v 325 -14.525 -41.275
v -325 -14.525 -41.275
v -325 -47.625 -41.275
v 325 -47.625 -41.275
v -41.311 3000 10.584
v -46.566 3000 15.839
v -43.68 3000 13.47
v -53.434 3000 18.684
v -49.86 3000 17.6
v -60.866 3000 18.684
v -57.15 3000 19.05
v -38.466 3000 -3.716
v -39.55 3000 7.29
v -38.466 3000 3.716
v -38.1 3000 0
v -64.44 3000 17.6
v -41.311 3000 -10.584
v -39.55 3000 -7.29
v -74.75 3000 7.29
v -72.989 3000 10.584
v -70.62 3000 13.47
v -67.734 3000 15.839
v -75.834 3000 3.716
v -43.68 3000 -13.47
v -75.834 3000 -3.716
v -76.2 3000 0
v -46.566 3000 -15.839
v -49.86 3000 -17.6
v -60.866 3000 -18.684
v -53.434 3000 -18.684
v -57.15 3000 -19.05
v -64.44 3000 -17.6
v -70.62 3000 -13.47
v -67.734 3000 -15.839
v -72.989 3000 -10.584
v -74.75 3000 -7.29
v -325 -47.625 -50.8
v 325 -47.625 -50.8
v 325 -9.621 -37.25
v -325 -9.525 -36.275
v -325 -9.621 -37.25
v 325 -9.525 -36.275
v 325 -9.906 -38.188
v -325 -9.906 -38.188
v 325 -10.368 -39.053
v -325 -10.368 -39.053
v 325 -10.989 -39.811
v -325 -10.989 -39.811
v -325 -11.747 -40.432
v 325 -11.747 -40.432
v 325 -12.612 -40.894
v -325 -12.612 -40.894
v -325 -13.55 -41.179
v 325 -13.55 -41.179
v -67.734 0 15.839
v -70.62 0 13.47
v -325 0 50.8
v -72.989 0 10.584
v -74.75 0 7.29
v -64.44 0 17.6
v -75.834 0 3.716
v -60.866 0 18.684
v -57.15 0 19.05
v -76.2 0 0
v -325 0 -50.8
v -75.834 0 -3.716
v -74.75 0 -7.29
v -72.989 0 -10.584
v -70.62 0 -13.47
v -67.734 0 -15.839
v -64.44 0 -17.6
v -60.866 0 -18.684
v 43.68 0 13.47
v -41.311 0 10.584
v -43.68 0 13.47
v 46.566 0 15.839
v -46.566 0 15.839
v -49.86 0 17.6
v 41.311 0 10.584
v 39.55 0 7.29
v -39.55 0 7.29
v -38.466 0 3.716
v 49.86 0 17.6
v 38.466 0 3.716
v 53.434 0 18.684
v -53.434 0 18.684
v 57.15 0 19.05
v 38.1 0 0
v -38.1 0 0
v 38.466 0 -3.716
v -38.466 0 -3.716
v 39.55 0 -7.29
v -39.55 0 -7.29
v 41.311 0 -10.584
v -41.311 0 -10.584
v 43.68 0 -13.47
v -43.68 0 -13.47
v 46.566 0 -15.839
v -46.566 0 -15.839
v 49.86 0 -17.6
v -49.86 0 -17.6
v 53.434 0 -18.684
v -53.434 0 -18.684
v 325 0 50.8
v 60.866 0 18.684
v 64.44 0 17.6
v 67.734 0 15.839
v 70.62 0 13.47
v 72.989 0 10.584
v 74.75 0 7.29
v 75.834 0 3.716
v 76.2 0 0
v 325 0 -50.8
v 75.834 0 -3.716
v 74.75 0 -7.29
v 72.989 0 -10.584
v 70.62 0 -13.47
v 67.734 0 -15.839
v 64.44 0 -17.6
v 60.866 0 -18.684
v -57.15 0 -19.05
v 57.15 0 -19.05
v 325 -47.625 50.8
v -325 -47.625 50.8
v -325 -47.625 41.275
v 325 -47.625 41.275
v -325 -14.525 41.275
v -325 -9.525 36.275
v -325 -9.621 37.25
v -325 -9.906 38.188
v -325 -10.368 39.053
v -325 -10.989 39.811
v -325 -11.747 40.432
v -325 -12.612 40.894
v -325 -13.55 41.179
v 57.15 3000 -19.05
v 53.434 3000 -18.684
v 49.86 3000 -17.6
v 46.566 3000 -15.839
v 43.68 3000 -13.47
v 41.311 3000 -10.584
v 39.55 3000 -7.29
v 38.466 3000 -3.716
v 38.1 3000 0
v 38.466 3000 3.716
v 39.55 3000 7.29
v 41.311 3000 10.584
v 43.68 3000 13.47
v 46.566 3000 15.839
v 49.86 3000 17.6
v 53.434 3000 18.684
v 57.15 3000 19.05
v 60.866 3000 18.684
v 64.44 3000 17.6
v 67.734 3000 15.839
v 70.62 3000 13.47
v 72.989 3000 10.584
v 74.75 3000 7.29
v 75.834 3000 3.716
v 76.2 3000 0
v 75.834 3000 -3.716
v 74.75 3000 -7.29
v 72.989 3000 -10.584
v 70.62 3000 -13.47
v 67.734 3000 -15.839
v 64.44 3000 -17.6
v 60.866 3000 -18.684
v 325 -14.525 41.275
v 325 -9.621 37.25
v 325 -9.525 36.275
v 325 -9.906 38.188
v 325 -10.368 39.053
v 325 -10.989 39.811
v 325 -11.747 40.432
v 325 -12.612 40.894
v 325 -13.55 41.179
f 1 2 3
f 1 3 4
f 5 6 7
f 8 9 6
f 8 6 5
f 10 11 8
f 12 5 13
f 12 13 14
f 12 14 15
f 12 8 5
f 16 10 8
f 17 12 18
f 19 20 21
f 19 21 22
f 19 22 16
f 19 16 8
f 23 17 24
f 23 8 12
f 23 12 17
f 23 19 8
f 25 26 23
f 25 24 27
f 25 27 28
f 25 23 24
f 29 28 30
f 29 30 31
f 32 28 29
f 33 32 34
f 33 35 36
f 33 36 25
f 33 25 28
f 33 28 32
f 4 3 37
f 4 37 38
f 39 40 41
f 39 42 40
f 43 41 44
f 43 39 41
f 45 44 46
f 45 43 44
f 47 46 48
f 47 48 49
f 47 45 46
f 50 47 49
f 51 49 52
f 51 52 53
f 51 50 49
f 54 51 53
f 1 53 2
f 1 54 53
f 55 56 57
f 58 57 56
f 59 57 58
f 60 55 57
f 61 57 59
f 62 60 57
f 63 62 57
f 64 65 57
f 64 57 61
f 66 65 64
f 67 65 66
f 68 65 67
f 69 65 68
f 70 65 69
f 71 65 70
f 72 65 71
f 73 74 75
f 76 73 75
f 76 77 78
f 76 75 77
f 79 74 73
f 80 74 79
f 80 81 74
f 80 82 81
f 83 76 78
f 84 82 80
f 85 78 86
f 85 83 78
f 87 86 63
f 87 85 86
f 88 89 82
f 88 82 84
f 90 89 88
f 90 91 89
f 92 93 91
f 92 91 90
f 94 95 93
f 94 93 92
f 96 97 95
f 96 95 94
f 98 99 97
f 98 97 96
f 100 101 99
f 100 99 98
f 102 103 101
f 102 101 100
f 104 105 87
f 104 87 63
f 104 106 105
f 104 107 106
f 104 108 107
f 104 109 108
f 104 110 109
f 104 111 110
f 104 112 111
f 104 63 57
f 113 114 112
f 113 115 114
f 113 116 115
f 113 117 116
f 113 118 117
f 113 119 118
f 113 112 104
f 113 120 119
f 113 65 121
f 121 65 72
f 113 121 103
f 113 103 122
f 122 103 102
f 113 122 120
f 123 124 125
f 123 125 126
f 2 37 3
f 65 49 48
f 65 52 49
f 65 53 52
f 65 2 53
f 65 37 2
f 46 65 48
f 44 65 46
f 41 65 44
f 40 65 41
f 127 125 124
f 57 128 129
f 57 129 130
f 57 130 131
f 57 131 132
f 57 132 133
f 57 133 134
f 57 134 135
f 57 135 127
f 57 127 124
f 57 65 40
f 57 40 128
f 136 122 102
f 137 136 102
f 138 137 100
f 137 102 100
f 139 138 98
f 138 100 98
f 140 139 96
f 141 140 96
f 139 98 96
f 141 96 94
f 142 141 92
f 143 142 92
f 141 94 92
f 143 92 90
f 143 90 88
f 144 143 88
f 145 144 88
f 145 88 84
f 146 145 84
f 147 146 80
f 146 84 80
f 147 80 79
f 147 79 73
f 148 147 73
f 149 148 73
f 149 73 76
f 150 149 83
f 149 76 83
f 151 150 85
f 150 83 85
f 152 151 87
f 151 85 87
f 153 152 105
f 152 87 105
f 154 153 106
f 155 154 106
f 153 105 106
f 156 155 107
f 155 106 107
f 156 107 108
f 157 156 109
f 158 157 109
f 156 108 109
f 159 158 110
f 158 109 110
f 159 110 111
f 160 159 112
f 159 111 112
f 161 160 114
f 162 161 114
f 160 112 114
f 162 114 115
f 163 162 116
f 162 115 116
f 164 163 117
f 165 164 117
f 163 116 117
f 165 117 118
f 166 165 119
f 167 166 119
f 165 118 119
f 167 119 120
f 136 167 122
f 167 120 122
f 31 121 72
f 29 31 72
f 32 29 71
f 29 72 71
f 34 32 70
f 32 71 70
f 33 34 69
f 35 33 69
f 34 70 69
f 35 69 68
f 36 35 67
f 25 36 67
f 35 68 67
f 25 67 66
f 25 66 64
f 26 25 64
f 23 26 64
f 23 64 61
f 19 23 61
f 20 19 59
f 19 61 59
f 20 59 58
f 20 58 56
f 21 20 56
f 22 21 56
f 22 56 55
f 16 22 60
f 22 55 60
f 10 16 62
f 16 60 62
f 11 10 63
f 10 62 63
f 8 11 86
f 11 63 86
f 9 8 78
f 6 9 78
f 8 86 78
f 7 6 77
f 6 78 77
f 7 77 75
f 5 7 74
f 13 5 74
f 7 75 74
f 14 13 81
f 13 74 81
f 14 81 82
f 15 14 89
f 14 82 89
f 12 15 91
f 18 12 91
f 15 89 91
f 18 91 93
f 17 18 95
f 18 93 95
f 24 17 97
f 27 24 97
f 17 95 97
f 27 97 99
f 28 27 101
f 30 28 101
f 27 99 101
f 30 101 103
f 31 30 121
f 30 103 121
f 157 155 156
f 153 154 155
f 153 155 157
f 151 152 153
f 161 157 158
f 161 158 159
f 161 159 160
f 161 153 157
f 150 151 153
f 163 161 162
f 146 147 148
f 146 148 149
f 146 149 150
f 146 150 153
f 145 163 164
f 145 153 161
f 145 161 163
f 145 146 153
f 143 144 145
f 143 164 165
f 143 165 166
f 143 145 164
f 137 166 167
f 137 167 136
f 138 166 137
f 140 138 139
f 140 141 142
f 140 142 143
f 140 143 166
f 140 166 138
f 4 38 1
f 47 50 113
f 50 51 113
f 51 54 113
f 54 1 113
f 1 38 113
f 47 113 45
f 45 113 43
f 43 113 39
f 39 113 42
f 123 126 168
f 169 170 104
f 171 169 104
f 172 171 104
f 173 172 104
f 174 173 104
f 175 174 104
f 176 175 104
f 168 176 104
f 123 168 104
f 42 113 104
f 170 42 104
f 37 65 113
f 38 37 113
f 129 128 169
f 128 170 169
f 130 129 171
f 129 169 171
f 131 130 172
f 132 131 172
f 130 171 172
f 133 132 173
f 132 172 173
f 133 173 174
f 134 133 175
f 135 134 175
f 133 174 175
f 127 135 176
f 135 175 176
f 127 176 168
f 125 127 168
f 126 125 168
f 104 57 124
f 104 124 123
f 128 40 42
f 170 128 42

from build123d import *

# Parameters (mm, degrees)
CROQUIS2_W              = 650
CROQUIS2_H              = 101.6
SALIENTE_EXTRUIR1_DEPTH = 9.525
CROQUIS3_W              = 650
CROQUIS3_H              = 9.525
SALIENTE_EXTRUIR2_DEPTH = 38.1
REDONDEO1_R             = 5
CROQUIS4_R              = 19.05
SALIENTE_EXTRUIR3_DEPTH = 3000


with BuildPart() as part:
    # Croquis2 → Saliente-Extruir1 (new body)
    with BuildSketch(Plane(origin=(0, 0, 0), x_dir=(1, 0, 0), z_dir=(0, 1, 0))):
        Rectangle(CROQUIS2_W, CROQUIS2_H)
    extrude(amount=-SALIENTE_EXTRUIR1_DEPTH)

    # Croquis3 → Saliente-Extruir2 (add)
    with BuildSketch(Plane.XZ.offset(9.525)):
        with Locations((0, 46.0375)):
            Rectangle(CROQUIS3_W, CROQUIS3_H)
        with Locations((0, -46.0375)):
            Rectangle(CROQUIS3_W, CROQUIS3_H)
    extrude(amount=SALIENTE_EXTRUIR2_DEPTH)

    # Redondeo1
    redondeo1_edges = [part.edges().sort_by_distance(p)[0] for p in [
        (0, -9.525, 41.275),
        (0, -9.525, -41.275),
    ]]
    fillet(redondeo1_edges, radius=REDONDEO1_R)

    # Croquis4 → Saliente-Extruir3 (add)
    with BuildSketch(Plane(origin=(0, 0, 0), x_dir=(1, 0, 0), z_dir=(0, 1, 0))):
        with Locations(Location((-57.15, 0, 0), (0, 0, 90))):
            Circle(CROQUIS4_R)
        with Locations(Location((57.15, 0, 0), (0, 0, 90))):
            Circle(CROQUIS4_R)
    extrude(amount=SALIENTE_EXTRUIR3_DEPTH)


solid = part.part
